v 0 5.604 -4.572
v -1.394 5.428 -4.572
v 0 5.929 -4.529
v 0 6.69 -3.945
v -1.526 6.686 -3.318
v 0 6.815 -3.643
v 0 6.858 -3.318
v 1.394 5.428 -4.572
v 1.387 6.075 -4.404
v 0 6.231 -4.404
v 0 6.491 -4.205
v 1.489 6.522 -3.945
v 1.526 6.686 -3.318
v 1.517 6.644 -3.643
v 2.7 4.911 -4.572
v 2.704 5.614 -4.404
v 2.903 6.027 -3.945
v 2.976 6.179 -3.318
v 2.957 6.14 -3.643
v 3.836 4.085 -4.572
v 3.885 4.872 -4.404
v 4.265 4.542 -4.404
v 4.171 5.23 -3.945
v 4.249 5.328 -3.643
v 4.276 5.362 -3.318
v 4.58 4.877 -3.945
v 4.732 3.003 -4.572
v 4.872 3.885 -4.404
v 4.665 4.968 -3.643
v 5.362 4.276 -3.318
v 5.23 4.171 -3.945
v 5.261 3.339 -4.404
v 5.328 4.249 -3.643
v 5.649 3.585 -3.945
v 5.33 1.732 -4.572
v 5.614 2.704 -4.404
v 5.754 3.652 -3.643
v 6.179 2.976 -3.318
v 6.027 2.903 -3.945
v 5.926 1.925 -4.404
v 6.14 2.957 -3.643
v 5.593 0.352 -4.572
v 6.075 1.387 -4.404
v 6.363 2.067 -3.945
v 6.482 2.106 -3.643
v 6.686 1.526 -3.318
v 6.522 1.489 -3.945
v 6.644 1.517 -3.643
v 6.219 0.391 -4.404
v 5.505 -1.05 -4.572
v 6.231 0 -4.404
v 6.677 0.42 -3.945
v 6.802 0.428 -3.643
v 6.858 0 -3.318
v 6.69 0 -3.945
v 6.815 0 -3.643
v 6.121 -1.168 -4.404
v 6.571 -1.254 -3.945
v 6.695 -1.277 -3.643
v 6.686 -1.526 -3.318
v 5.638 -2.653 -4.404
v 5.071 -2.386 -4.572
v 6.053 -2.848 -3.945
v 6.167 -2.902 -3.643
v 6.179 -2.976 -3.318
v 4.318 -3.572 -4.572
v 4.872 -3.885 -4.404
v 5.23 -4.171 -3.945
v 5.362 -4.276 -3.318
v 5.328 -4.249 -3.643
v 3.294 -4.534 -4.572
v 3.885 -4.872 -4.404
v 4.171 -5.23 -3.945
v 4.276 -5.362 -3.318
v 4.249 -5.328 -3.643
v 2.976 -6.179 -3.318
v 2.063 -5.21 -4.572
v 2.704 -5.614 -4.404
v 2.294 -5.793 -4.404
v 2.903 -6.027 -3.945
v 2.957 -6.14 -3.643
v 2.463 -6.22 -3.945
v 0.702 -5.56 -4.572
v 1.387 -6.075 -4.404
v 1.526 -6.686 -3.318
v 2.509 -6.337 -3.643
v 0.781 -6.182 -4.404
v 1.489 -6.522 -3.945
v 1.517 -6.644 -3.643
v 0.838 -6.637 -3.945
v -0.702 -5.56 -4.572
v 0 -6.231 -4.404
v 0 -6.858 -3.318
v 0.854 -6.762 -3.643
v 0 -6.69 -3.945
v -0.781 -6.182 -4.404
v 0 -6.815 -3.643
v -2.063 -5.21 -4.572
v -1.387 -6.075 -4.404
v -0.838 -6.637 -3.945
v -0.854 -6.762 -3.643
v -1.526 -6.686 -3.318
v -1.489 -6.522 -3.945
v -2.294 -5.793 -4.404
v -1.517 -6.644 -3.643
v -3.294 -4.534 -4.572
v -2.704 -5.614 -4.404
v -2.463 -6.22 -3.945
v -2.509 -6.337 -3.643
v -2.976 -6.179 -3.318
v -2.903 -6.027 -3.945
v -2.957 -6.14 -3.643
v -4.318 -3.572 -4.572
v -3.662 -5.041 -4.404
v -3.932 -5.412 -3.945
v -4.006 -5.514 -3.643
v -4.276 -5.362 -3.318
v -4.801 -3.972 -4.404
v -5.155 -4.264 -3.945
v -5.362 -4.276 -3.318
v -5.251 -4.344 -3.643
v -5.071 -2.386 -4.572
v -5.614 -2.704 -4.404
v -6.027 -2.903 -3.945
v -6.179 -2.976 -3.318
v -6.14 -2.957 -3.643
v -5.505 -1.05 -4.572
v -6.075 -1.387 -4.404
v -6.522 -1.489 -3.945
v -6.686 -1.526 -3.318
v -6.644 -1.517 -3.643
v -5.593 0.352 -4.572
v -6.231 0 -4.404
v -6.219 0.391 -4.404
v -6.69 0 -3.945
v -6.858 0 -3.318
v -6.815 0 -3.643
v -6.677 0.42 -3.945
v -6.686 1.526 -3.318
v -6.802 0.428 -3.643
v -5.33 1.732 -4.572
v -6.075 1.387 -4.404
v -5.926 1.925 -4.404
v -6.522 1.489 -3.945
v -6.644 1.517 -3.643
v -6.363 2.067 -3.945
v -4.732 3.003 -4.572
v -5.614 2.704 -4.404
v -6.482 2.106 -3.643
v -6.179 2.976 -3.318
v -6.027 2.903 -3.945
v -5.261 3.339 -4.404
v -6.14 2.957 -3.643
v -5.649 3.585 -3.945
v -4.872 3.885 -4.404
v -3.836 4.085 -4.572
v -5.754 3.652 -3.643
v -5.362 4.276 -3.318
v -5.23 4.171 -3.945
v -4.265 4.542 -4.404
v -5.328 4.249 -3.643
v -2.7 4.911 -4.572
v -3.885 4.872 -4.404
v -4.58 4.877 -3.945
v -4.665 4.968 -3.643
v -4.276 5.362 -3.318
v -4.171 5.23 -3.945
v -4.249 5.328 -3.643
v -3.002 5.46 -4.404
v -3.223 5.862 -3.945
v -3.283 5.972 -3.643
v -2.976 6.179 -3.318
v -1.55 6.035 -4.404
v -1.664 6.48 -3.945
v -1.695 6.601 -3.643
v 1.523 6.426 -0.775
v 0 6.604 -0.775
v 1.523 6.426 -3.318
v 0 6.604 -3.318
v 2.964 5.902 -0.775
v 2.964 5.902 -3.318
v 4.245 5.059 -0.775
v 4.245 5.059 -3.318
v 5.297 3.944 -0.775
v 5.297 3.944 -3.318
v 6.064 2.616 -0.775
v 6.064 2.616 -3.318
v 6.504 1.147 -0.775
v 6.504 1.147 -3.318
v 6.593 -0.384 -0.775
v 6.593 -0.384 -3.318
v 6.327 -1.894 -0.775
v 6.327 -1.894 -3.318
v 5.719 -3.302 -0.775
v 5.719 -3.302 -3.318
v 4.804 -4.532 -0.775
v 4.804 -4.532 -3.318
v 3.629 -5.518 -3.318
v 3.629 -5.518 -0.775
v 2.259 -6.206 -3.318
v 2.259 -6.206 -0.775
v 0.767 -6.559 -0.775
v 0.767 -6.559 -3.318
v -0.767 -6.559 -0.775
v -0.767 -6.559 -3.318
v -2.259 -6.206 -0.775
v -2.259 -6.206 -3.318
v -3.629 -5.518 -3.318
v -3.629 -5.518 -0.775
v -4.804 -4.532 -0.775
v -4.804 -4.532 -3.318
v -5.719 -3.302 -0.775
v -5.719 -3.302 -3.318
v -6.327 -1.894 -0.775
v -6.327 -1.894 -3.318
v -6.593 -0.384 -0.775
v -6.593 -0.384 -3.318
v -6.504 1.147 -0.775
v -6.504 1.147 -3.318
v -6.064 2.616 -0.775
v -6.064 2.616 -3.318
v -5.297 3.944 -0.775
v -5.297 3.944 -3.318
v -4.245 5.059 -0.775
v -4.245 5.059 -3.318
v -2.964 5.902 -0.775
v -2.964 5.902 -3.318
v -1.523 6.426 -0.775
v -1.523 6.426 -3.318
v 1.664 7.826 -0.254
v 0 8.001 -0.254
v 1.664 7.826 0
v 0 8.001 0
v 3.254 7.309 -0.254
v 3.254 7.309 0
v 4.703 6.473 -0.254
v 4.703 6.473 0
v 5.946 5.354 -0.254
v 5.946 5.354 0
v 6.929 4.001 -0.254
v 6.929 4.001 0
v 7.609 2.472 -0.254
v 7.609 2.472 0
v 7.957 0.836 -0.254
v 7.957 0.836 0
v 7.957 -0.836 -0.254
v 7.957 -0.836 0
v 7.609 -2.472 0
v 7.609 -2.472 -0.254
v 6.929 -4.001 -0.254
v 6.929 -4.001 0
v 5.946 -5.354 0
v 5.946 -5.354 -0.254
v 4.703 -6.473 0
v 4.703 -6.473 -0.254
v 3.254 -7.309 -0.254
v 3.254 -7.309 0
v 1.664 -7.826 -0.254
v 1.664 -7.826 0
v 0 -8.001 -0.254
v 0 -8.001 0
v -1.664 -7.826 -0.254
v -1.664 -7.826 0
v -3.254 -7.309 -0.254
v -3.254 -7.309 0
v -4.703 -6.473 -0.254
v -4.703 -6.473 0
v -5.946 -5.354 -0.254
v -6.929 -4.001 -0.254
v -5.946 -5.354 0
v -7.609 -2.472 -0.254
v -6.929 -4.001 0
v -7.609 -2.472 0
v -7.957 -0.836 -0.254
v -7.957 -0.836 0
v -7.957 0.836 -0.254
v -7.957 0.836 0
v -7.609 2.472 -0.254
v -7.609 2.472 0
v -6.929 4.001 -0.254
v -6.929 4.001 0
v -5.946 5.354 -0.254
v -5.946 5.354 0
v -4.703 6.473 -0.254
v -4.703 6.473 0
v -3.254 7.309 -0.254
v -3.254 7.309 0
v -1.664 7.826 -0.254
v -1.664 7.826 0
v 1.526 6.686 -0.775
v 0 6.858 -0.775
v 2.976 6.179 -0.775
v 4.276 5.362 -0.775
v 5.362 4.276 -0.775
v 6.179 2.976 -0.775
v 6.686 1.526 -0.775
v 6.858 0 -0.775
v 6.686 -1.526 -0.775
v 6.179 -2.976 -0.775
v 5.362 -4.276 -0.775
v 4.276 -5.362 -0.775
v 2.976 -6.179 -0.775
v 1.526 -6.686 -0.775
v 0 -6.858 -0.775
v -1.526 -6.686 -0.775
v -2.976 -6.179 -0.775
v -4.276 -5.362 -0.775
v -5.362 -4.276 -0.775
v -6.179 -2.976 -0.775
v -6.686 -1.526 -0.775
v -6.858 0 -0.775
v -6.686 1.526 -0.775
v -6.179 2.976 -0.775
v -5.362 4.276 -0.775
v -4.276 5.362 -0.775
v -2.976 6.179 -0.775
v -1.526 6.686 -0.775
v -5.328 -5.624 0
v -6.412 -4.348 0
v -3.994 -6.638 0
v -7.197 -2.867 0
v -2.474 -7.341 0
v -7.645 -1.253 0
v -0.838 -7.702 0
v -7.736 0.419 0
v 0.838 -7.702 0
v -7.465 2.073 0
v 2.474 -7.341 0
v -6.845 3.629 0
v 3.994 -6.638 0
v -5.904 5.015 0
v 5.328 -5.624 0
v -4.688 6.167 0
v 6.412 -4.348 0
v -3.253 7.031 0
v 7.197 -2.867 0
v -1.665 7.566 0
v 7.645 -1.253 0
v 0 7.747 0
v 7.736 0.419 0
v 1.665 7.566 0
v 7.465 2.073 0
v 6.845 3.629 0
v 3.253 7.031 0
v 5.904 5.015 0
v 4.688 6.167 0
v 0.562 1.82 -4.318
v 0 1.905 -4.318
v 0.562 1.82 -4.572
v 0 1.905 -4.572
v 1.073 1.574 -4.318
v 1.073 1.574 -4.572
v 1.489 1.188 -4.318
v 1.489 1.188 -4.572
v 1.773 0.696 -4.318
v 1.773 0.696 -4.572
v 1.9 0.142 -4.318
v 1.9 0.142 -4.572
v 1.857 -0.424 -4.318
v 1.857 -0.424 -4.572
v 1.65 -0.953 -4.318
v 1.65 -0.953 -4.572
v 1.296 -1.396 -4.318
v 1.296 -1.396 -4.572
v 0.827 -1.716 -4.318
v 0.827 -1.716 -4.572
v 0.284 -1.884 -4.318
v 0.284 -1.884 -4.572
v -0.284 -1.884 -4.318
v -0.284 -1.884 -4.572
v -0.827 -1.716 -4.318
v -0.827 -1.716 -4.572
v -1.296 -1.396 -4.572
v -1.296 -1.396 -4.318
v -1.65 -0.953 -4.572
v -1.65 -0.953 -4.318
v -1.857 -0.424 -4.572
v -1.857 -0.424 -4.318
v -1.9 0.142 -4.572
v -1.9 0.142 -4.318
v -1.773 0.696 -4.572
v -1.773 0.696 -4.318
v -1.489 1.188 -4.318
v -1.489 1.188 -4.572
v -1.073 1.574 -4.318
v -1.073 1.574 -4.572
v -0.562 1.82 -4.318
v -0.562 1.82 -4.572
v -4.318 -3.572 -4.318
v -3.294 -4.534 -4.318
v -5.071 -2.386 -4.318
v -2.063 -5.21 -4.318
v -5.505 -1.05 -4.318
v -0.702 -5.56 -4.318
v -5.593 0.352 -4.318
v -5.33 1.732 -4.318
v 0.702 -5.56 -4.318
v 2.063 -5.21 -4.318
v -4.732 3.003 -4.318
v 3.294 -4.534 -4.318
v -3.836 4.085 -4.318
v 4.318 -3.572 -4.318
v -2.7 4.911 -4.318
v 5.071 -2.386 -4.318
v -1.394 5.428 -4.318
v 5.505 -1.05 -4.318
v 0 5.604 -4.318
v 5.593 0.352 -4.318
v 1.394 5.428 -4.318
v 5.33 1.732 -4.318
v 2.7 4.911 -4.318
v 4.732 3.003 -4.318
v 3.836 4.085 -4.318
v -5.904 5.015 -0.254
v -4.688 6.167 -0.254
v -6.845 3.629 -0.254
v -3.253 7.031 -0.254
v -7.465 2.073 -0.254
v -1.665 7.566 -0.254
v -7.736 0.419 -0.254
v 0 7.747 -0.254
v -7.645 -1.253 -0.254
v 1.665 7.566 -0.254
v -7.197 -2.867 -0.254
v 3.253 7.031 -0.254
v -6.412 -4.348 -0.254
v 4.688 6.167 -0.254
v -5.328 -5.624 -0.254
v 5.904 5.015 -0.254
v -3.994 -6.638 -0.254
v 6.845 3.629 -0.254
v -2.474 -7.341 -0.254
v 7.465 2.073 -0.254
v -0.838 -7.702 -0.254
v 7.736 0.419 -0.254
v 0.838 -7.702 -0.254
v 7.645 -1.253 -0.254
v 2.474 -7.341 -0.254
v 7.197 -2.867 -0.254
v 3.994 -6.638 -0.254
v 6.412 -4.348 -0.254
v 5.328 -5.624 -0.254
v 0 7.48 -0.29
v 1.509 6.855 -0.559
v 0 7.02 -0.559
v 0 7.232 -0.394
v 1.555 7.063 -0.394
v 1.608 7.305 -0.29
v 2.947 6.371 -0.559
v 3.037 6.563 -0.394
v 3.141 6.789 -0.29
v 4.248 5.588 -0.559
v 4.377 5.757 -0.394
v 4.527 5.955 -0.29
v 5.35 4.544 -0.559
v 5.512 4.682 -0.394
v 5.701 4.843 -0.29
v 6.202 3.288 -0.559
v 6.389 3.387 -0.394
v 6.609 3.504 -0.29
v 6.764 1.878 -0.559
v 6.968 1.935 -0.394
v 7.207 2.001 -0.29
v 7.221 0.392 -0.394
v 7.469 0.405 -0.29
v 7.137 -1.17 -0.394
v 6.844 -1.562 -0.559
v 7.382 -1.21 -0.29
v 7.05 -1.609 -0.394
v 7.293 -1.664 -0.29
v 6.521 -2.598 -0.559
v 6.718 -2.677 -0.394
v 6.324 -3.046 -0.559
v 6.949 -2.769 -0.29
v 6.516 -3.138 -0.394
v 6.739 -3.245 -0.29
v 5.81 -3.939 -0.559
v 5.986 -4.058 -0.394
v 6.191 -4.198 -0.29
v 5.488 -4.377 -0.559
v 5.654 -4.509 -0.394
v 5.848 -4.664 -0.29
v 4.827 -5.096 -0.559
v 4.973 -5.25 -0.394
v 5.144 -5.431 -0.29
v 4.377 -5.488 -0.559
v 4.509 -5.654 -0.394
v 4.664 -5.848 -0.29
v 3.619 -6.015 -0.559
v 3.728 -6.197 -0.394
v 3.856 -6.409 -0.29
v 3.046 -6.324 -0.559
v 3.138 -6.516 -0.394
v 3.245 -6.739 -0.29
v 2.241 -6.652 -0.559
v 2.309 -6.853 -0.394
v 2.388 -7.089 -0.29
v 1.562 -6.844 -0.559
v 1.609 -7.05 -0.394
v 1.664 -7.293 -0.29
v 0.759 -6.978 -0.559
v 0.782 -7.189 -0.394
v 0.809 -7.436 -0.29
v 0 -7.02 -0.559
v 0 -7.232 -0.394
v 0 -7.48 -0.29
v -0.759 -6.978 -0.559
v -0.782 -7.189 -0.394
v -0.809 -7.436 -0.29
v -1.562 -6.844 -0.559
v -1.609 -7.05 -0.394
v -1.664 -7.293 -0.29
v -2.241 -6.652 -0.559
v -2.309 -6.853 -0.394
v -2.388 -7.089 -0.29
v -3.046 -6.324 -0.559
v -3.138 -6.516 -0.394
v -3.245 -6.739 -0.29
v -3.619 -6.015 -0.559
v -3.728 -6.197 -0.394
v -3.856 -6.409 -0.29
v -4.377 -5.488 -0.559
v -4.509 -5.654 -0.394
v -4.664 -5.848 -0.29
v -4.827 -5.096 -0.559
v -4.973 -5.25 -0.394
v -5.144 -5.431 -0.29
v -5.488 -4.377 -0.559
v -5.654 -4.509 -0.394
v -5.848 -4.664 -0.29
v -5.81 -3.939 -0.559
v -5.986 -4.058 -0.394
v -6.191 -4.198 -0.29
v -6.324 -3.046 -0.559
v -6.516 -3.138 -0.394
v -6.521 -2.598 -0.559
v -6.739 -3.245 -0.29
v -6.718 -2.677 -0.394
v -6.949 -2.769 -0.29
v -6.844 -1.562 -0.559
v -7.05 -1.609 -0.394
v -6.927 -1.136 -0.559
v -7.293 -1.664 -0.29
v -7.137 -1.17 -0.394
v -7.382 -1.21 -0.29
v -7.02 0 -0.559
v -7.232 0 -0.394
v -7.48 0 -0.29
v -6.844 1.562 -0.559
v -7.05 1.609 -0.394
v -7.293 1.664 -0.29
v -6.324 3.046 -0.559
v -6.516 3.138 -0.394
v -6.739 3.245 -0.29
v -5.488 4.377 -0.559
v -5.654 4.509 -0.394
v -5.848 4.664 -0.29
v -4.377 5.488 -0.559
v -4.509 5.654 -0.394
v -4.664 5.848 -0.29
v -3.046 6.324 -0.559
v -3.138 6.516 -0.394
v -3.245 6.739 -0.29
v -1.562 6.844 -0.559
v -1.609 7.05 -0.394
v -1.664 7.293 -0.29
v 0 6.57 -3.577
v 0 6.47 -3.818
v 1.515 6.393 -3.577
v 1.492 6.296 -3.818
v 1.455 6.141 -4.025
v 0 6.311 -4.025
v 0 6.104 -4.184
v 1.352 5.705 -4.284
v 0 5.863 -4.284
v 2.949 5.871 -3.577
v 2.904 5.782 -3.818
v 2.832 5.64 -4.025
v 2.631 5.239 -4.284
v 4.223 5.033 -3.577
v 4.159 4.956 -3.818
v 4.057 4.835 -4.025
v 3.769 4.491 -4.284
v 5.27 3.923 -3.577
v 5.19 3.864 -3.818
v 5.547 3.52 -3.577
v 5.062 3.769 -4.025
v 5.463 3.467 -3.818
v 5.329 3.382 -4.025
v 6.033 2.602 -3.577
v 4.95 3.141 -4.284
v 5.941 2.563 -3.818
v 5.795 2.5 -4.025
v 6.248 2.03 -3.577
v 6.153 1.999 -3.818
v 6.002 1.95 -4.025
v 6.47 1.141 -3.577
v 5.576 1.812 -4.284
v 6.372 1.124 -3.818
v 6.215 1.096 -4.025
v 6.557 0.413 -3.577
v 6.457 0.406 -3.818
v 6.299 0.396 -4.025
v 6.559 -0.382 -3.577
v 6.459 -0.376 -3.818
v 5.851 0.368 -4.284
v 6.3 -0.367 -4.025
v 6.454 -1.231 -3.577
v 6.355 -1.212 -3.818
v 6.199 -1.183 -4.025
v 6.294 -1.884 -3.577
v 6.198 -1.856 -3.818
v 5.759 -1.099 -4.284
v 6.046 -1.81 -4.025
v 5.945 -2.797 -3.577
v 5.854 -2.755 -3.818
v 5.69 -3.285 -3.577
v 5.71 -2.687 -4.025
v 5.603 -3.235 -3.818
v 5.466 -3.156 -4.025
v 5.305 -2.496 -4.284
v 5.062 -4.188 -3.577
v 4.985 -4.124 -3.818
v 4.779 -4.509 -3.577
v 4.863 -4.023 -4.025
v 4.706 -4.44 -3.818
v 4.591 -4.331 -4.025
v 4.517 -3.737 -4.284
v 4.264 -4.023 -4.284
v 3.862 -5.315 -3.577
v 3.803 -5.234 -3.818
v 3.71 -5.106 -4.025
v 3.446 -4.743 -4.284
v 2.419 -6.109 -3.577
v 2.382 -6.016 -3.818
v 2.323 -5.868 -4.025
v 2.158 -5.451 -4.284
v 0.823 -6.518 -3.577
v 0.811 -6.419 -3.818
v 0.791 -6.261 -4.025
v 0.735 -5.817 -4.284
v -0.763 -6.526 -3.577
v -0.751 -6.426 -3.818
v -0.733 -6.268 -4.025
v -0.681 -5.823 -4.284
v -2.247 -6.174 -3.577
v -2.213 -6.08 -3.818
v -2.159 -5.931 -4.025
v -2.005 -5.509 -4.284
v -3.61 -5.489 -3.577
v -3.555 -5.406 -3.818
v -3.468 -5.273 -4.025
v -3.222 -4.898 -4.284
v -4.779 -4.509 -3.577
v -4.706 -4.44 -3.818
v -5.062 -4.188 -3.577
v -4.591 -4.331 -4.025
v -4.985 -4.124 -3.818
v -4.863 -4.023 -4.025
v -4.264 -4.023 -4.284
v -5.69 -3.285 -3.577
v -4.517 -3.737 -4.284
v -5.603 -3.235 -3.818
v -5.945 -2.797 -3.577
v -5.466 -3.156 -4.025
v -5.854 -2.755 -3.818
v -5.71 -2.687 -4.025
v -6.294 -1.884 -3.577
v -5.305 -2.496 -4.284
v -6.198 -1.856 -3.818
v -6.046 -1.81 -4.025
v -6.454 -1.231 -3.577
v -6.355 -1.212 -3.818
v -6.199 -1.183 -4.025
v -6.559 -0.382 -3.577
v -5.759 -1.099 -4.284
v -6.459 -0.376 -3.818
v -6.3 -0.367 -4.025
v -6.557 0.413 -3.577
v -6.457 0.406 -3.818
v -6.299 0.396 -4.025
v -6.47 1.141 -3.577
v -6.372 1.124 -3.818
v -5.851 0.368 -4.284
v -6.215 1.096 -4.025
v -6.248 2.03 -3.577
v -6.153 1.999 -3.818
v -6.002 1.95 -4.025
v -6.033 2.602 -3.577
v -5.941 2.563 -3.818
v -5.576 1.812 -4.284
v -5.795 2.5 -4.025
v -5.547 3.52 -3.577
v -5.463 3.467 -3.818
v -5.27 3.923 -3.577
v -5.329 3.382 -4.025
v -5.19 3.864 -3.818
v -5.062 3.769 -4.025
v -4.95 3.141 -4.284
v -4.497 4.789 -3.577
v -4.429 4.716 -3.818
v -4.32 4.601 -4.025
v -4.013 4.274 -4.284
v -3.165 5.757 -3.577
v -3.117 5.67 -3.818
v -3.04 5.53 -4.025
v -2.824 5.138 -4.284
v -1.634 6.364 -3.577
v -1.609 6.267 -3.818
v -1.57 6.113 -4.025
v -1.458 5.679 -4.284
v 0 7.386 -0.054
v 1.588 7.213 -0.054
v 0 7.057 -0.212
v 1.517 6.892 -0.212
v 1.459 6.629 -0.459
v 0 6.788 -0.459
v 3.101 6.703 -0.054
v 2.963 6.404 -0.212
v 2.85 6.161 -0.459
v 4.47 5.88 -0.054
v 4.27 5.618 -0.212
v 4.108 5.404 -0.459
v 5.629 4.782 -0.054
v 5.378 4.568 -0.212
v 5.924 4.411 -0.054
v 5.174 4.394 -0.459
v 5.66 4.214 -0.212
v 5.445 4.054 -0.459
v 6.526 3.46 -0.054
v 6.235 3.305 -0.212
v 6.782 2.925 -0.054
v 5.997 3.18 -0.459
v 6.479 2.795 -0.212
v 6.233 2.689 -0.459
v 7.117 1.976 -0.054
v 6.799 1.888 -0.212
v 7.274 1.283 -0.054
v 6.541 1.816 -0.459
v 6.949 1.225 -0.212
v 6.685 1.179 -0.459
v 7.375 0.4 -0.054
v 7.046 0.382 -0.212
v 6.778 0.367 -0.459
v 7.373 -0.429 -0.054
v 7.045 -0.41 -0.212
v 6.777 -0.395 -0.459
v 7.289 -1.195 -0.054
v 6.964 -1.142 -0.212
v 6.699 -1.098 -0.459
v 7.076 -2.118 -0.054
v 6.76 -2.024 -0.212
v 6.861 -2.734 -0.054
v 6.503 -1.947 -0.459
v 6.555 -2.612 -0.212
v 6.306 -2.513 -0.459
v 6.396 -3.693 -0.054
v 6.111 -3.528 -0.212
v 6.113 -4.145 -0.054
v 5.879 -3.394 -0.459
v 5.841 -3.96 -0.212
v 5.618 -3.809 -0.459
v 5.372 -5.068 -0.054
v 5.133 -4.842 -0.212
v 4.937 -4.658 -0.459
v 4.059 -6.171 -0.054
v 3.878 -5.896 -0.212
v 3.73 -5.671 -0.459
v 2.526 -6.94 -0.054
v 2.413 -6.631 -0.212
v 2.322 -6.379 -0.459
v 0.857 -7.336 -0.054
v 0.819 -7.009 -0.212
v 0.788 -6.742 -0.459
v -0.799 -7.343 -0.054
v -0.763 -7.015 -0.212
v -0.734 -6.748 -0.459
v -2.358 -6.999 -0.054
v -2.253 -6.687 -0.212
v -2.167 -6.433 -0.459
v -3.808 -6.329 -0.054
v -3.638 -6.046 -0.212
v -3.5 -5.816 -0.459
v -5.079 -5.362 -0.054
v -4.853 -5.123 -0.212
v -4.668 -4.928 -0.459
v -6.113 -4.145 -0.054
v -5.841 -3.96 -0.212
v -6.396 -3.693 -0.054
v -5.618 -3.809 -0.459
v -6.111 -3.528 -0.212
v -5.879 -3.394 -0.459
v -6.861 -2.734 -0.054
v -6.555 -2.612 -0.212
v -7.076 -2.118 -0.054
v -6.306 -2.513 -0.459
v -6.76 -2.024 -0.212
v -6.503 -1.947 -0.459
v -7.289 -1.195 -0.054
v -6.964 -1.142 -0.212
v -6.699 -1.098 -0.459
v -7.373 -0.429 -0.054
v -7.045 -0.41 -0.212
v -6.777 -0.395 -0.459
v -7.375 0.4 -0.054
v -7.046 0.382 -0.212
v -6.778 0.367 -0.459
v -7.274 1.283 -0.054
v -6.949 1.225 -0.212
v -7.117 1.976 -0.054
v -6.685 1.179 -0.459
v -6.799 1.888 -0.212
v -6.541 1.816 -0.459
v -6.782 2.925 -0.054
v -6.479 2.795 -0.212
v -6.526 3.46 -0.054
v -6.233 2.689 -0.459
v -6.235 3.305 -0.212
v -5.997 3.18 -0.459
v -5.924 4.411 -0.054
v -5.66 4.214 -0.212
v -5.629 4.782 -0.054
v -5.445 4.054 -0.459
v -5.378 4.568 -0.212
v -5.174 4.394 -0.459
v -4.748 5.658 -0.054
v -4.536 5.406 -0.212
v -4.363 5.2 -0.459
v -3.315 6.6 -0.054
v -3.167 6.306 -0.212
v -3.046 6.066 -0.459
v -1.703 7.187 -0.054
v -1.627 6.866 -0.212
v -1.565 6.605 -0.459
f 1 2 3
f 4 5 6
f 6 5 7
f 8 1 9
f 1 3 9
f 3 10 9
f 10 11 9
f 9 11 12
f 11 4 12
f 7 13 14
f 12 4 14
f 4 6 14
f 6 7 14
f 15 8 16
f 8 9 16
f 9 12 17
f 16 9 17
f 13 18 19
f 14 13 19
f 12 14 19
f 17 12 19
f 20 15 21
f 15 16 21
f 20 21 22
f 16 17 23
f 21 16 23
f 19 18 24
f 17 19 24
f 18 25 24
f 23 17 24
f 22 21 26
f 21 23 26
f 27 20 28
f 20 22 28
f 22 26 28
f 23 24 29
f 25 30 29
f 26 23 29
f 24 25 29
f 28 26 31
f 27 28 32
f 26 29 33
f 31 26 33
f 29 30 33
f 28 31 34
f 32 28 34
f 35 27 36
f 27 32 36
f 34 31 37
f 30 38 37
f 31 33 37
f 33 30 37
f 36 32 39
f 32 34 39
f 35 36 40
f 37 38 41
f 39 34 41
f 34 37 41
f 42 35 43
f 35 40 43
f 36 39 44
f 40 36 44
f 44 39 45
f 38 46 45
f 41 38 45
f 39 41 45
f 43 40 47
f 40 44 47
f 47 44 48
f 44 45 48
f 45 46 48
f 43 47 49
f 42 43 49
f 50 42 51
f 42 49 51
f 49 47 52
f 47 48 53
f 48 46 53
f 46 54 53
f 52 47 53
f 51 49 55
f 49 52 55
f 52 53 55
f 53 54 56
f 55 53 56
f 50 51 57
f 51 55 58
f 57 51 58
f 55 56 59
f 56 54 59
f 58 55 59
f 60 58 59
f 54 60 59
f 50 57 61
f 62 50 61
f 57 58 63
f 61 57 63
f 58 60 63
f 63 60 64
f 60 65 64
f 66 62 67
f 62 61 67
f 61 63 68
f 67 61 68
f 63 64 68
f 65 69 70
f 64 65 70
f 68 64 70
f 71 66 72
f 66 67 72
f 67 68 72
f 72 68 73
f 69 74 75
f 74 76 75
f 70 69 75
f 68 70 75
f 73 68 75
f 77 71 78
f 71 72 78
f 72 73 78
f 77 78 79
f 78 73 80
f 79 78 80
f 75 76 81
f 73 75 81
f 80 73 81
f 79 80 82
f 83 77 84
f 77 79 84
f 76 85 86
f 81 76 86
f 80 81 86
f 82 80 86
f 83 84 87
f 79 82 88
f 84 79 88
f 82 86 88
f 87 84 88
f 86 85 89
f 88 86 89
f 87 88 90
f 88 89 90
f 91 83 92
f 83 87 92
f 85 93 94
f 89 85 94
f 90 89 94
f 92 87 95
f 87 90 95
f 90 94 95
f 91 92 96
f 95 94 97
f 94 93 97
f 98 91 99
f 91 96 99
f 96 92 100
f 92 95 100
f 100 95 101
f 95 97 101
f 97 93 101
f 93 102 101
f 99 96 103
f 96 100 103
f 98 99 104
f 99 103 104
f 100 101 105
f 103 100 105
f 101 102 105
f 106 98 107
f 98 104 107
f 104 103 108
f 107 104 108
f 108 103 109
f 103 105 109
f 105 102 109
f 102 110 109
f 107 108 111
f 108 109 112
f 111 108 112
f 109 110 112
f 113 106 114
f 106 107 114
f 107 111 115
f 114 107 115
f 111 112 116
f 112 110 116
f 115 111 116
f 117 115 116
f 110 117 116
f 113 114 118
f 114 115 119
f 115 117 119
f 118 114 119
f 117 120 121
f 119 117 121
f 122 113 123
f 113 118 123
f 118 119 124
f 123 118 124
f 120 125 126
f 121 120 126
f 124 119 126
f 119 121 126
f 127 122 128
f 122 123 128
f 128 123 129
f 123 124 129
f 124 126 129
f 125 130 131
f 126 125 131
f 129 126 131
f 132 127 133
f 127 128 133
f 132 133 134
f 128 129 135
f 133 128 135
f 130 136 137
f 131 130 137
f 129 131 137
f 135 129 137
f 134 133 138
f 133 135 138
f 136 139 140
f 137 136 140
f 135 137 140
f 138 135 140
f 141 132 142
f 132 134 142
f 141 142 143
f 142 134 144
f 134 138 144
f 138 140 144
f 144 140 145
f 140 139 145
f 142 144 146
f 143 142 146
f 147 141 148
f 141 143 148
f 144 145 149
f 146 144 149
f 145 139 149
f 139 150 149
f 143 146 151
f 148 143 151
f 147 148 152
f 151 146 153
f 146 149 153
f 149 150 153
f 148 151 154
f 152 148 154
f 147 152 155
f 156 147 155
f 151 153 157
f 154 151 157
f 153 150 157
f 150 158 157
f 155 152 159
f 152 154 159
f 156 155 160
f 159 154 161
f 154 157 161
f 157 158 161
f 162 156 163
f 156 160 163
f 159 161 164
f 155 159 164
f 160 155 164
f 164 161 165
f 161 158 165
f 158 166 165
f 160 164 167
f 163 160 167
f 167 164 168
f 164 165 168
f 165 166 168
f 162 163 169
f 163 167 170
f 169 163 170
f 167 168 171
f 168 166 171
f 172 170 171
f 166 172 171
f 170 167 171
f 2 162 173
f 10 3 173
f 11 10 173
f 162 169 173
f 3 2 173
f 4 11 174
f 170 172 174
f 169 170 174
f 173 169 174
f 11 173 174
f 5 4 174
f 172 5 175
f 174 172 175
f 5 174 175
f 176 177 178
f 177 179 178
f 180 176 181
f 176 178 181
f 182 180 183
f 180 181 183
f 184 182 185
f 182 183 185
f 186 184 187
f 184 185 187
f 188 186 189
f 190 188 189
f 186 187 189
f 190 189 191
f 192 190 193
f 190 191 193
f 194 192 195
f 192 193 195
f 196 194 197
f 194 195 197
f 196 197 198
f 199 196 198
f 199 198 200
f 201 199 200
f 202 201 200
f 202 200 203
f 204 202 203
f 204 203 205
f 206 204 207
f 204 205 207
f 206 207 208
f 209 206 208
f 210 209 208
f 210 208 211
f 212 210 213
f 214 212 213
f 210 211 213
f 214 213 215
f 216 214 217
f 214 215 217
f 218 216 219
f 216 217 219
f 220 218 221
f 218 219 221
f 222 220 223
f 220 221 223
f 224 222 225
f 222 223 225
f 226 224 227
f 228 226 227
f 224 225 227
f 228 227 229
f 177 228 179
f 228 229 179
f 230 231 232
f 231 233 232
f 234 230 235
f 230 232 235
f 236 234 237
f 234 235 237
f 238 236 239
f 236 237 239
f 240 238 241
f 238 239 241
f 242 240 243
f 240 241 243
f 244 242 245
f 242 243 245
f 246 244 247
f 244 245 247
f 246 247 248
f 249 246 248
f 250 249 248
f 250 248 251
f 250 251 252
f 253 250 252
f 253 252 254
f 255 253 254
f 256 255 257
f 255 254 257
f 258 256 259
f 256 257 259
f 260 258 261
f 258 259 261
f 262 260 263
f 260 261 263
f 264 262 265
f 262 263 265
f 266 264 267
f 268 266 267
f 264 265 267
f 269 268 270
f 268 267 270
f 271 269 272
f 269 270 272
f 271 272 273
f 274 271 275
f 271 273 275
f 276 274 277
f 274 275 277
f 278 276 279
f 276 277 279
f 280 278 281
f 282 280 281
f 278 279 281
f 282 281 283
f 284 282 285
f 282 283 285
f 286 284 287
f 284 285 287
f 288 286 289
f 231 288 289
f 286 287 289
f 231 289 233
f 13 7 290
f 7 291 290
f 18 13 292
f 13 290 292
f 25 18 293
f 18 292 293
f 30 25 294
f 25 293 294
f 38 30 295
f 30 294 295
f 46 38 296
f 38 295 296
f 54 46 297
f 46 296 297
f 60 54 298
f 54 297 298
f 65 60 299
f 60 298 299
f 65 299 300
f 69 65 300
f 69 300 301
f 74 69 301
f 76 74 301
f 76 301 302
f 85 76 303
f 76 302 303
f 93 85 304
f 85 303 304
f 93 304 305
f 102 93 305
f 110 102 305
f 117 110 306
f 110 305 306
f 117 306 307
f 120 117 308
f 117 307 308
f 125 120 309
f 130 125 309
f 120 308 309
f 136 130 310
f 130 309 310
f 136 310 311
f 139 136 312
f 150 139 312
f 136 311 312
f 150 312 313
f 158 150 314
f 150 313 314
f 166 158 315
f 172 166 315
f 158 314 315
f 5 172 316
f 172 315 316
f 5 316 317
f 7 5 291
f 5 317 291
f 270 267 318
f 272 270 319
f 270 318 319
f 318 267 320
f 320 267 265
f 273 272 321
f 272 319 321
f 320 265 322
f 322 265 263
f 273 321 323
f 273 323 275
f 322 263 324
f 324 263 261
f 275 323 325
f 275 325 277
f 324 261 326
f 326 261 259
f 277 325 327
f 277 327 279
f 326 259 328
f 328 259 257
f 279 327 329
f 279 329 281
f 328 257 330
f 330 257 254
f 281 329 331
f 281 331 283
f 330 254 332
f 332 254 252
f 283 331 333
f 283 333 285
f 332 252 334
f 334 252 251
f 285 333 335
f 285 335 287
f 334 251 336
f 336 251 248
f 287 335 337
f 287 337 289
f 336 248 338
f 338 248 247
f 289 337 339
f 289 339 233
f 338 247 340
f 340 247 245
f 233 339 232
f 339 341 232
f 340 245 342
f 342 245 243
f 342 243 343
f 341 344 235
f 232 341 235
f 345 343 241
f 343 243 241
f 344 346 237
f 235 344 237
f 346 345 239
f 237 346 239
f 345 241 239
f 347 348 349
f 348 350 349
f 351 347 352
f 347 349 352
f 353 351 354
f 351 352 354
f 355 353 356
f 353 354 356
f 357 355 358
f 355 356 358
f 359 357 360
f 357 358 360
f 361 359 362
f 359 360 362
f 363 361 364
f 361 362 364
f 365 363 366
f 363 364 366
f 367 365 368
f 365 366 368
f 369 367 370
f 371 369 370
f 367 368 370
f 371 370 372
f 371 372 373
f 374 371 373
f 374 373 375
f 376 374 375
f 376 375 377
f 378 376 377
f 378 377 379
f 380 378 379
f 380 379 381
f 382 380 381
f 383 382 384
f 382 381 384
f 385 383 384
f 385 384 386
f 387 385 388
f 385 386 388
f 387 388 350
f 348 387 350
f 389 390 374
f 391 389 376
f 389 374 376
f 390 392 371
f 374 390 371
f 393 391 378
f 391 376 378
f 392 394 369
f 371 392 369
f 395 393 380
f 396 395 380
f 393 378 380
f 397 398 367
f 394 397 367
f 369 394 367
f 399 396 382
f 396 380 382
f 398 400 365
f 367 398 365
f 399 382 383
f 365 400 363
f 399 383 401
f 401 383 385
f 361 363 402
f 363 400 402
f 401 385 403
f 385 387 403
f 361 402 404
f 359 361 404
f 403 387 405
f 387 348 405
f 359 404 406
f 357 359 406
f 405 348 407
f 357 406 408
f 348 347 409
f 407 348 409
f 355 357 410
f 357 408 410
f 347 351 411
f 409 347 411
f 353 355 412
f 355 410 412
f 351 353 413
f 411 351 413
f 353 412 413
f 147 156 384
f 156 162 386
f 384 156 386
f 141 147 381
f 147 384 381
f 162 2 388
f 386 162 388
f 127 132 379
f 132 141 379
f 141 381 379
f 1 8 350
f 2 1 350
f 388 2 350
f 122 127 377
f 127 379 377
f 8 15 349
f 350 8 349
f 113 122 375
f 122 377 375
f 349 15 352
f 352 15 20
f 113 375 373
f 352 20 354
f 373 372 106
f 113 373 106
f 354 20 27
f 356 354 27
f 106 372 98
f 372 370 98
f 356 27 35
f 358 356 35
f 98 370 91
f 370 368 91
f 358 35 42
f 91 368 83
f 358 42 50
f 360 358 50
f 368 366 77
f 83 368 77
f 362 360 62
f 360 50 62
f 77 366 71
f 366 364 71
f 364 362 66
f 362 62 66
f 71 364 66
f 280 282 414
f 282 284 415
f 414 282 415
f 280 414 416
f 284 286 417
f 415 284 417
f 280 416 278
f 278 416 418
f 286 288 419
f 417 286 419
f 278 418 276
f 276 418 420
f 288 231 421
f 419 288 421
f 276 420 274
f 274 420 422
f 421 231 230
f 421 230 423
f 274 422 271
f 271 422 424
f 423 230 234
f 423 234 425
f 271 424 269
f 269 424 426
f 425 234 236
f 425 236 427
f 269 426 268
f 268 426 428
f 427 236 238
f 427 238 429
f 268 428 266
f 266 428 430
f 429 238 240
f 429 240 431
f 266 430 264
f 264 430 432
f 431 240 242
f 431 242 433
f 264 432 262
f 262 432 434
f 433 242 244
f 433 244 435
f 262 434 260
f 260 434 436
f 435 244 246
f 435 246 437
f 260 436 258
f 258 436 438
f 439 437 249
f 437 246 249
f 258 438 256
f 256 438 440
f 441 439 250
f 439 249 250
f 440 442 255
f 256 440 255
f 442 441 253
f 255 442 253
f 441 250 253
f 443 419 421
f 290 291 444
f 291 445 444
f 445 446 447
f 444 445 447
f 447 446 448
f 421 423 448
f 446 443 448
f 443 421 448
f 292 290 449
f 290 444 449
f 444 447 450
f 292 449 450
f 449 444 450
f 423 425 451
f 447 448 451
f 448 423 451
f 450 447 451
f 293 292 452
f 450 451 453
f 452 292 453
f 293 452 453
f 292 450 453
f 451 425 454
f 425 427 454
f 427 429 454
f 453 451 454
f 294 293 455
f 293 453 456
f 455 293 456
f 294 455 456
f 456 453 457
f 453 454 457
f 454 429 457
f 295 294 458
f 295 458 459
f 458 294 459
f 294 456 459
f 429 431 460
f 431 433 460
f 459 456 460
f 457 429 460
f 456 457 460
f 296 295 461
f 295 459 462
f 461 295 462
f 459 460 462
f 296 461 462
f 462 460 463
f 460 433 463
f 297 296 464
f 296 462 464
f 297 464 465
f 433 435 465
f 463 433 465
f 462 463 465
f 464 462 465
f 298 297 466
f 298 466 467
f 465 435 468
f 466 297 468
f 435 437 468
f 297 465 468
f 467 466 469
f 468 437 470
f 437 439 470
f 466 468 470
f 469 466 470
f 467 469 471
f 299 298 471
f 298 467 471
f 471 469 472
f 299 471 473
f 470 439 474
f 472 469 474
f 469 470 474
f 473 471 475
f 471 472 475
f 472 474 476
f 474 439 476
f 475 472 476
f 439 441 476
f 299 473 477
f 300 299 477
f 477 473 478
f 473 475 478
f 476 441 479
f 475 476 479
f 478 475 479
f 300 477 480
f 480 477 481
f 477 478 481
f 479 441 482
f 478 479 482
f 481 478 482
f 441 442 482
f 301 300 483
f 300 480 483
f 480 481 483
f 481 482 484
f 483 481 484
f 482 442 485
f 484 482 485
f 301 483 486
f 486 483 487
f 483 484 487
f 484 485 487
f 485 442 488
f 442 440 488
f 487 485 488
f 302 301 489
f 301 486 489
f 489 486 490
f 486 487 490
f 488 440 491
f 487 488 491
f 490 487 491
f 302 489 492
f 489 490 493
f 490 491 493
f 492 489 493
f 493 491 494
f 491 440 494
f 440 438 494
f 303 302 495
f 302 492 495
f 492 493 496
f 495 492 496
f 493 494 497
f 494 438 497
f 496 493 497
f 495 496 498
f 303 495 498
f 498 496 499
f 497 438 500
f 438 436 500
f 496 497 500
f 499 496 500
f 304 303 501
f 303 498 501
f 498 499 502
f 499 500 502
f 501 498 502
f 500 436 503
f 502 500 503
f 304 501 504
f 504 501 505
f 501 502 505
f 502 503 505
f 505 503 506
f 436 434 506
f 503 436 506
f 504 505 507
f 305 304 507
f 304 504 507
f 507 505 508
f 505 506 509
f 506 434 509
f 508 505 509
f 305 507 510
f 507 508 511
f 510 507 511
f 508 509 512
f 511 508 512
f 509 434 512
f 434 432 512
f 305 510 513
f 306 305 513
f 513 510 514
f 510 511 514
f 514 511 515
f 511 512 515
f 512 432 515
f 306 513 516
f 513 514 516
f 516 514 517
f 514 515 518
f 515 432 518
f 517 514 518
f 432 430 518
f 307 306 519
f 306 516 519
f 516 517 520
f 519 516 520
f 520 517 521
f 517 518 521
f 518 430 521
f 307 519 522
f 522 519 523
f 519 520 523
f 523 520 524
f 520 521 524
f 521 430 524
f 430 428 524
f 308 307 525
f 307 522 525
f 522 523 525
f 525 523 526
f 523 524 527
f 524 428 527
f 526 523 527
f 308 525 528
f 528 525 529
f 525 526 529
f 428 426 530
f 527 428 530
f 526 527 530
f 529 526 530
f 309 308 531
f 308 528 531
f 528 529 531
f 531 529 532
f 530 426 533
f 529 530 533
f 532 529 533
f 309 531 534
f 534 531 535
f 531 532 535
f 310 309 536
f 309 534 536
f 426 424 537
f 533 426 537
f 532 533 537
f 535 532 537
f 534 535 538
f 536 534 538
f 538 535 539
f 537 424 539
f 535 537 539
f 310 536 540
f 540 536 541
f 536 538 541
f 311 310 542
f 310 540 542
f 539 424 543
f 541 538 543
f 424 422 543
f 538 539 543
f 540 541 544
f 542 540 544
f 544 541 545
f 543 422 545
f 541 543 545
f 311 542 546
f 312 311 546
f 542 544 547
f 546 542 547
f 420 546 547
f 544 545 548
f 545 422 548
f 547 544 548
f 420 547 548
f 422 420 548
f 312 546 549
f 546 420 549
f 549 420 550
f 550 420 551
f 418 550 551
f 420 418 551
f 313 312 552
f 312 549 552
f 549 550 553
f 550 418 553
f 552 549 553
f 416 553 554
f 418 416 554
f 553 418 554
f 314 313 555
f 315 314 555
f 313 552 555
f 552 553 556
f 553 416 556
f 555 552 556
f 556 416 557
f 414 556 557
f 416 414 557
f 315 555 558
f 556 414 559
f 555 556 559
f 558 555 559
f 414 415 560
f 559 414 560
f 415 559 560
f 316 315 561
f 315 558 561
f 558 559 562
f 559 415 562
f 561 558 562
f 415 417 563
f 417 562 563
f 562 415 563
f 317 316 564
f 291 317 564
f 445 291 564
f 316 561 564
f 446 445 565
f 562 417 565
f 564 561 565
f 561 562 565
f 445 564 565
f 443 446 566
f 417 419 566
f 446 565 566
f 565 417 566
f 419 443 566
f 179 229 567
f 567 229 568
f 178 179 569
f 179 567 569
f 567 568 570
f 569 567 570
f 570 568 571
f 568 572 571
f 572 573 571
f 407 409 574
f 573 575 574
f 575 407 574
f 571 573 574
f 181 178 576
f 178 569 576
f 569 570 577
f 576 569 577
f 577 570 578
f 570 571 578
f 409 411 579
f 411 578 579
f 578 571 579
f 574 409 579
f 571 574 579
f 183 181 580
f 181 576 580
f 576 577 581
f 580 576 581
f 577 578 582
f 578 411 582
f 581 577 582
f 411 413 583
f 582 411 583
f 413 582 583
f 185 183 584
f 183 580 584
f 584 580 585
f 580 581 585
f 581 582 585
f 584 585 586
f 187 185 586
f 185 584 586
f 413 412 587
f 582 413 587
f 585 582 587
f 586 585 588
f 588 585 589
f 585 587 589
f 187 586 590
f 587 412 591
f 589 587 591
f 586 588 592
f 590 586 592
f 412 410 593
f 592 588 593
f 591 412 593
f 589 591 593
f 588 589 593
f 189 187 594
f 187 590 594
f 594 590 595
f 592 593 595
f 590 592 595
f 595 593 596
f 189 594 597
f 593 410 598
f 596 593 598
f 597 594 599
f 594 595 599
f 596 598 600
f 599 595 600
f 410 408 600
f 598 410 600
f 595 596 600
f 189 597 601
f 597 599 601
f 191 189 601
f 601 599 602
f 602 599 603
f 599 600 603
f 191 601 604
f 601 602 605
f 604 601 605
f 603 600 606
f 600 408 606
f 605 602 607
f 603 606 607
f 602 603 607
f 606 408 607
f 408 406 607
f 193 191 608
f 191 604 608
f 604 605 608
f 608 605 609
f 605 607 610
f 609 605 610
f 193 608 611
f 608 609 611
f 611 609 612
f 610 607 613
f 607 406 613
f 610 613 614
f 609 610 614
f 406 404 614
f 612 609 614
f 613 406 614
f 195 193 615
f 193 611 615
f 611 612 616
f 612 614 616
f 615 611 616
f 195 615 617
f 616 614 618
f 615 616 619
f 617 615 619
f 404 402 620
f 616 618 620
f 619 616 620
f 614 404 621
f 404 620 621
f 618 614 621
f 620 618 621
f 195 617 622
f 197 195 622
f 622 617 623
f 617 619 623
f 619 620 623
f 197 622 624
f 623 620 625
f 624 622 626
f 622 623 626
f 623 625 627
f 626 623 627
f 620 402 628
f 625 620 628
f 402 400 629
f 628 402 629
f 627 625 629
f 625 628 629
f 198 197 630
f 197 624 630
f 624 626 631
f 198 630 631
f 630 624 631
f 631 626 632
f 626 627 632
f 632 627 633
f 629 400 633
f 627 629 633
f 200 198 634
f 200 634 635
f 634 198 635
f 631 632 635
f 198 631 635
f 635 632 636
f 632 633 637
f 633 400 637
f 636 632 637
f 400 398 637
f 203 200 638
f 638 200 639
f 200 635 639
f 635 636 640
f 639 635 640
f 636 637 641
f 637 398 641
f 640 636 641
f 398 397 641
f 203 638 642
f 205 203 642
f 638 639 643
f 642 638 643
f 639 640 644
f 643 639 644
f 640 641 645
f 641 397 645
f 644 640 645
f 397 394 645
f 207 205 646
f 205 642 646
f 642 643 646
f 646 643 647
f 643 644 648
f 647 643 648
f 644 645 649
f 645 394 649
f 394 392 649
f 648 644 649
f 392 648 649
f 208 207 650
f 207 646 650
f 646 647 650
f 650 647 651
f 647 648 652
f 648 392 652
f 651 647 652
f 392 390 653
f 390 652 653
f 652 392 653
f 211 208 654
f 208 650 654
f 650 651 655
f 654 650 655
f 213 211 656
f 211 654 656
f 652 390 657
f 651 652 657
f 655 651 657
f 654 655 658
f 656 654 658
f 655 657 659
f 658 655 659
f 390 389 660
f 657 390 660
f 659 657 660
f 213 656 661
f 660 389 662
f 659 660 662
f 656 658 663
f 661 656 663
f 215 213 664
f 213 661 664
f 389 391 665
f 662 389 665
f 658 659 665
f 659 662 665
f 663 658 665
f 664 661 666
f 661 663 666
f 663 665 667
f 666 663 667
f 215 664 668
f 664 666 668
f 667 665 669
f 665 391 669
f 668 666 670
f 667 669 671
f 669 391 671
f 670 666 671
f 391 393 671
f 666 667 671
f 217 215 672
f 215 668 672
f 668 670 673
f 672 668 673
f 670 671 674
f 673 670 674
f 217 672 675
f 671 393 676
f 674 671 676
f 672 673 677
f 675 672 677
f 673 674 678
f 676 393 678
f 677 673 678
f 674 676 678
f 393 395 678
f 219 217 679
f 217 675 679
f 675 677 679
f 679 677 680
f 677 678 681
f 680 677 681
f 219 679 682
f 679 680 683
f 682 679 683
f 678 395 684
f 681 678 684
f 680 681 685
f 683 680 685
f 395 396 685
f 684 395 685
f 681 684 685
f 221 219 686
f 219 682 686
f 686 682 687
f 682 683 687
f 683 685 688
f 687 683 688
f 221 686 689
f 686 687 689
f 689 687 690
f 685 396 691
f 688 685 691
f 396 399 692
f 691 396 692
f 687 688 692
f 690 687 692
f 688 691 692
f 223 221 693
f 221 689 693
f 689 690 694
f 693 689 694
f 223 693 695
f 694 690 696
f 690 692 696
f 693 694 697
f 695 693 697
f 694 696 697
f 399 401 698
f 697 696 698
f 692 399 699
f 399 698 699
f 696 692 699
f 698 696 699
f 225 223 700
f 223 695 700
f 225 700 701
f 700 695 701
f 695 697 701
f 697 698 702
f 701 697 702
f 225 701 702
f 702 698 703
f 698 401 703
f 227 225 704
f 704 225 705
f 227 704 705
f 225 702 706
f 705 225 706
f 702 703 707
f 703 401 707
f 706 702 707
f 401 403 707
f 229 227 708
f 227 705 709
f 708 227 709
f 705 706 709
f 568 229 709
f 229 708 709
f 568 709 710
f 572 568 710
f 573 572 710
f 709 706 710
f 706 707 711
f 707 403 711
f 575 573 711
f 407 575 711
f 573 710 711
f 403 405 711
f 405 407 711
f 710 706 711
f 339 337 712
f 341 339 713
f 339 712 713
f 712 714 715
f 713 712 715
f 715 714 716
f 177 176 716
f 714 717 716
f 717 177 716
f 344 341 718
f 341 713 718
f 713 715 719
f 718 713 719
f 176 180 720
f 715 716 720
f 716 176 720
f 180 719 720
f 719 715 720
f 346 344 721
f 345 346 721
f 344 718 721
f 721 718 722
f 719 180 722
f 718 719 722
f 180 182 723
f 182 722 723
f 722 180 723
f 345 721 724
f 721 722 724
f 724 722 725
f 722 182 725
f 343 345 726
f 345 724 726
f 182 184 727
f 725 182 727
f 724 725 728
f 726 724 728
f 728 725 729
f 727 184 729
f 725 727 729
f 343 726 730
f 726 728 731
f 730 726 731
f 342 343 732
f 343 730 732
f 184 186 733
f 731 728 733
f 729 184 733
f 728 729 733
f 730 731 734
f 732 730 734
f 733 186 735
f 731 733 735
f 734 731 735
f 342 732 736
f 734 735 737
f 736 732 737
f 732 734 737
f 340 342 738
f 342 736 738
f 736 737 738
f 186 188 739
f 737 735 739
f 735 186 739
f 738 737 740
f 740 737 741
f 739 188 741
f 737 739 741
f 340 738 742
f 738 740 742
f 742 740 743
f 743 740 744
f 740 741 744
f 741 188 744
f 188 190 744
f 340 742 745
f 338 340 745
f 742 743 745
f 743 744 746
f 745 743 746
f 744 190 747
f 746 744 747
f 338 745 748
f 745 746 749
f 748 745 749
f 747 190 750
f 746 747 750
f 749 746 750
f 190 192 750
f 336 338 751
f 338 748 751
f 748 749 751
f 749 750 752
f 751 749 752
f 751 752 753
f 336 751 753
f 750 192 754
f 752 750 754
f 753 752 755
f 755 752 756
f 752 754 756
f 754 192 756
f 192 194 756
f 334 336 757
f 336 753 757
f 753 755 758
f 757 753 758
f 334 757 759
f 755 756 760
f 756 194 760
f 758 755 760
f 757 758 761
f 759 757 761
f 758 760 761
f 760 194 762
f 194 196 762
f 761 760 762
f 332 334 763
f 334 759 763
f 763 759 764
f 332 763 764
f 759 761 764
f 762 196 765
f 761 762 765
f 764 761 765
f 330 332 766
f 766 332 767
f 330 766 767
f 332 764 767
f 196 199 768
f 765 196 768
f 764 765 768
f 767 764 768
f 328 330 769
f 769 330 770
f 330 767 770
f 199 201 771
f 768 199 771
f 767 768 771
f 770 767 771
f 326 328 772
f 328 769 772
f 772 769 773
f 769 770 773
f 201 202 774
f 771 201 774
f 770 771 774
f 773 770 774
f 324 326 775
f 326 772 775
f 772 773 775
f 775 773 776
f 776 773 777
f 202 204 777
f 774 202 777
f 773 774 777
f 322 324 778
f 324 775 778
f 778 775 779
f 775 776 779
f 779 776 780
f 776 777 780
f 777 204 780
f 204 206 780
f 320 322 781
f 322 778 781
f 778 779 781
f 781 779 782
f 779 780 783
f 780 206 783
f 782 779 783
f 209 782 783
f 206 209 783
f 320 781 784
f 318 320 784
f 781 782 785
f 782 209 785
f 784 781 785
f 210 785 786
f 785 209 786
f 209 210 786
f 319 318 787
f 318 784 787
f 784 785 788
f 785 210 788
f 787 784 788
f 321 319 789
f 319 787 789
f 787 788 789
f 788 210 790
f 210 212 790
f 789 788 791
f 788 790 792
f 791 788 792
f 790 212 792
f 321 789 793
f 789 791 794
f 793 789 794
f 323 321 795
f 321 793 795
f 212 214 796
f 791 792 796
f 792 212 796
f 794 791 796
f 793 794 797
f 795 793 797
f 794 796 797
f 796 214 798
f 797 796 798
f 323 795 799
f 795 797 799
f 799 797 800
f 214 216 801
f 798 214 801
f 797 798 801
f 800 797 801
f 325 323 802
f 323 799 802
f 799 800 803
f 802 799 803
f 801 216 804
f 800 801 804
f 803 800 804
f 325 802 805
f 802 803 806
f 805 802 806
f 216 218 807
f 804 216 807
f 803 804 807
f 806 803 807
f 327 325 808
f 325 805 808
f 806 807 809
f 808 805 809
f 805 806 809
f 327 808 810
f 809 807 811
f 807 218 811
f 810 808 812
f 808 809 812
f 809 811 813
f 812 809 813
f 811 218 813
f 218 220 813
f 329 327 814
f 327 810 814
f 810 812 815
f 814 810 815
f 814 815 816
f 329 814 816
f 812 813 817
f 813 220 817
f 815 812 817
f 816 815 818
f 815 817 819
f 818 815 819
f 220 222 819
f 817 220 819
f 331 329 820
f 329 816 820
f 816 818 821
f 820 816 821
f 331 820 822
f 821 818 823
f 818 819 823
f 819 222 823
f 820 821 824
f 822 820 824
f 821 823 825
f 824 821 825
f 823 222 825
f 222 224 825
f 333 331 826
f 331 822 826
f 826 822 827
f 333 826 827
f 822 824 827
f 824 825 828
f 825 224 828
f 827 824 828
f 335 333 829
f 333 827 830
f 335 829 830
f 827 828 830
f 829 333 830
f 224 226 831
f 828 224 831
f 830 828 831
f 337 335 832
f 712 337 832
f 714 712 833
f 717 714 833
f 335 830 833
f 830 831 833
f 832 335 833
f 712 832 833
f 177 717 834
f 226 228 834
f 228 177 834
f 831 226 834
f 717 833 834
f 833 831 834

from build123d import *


with BuildPart() as part:
    # Sketch1 → Revolve1 (revolve)
    with BuildSketch(Plane(origin=(0, 0, 0), x_dir=(0, 0, -1), z_dir=(1, 0, 0))):
        with BuildLine():
            Line((0, 8.001), (0, 7.747))
            ThreePointArc((0, 7.747), (0.21198872, 7.056541514), (0.774908178, 6.604))
            Line((0.774908178, 6.604), (3.31799946, 6.604))
            ThreePointArc((3.31799946, 6.604), (4.025106623, 6.311106623), (4.318, 5.60399946))
            Line((4.318, 5.60399946), (4.318, 1.905))
            Line((4.318, 1.905), (4.572, 1.905))
            Line((4.572, 1.905), (4.572, 5.60399946))
            ThreePointArc((4.572, 5.60399946), (4.204711745, 6.490711745), (3.31799946, 6.858))
            Line((3.31799946, 6.858), (0.774908178, 6.858))
            ThreePointArc((0.774908178, 6.858), (0.393818958, 7.231814031), (0.254, 7.747))
            Line((0.254, 7.747), (0.254, 8.001))
            Line((0.254, 8.001), (0, 8.001))
        make_face()
    revolve(axis=Axis((0, 0, 11.444404328), (0, 0, -1)))


solid = part.part
